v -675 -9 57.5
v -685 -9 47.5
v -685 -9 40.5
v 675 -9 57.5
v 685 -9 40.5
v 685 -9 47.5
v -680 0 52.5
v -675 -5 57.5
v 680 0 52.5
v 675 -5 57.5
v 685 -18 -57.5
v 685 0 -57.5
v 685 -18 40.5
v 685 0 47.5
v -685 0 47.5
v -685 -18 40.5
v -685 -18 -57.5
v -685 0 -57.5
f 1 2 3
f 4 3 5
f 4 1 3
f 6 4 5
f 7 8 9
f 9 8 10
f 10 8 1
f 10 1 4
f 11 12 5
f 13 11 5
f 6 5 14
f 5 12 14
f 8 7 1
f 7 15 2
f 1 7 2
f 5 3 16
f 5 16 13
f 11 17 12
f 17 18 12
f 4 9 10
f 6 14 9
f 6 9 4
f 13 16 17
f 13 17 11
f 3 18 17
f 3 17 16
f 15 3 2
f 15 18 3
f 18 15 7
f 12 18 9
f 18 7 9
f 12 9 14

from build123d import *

# Parameters (mm, degrees)
F0_W     = 1370
F0_H     = 115
F1_DEPTH = 9
F2_W     = 1370
F2_H     = 98
F3_DEPTH = 9
F4_SIZE  = 5
F5_SIZE  = 10
F6_SIZE  = 10


with BuildPart() as f1:
    # F0 (on Front) → F1 (new body)
    with BuildSketch(Plane.XZ):
        Rectangle(F0_W, F0_H)
    extrude(amount=F1_DEPTH)

    # F2 (on face) → F3 (join)
    with BuildSketch(Plane.XZ.offset(9)):
        with Locations((0, -8.5)):
            Rectangle(F2_W, F2_H)
    extrude(amount=F3_DEPTH)

    # F4
    f4_edges = [f1.edges().sort_by_distance(p)[0] for p in [
        (0, 0, 57.5),
    ]]
    chamfer(f4_edges, length=F4_SIZE)

    # F5
    f5_edges = [f1.edges().sort_by_distance(p)[0] for p in [
        (685, -7, 57.5),
    ]]
    chamfer(f5_edges, length=F5_SIZE)

    # F6
    f6_edges = [f1.edges().sort_by_distance(p)[0] for p in [
        (-685, -7, 57.5),
    ]]
    chamfer(f6_edges, length=F6_SIZE)


solid = f1.part
